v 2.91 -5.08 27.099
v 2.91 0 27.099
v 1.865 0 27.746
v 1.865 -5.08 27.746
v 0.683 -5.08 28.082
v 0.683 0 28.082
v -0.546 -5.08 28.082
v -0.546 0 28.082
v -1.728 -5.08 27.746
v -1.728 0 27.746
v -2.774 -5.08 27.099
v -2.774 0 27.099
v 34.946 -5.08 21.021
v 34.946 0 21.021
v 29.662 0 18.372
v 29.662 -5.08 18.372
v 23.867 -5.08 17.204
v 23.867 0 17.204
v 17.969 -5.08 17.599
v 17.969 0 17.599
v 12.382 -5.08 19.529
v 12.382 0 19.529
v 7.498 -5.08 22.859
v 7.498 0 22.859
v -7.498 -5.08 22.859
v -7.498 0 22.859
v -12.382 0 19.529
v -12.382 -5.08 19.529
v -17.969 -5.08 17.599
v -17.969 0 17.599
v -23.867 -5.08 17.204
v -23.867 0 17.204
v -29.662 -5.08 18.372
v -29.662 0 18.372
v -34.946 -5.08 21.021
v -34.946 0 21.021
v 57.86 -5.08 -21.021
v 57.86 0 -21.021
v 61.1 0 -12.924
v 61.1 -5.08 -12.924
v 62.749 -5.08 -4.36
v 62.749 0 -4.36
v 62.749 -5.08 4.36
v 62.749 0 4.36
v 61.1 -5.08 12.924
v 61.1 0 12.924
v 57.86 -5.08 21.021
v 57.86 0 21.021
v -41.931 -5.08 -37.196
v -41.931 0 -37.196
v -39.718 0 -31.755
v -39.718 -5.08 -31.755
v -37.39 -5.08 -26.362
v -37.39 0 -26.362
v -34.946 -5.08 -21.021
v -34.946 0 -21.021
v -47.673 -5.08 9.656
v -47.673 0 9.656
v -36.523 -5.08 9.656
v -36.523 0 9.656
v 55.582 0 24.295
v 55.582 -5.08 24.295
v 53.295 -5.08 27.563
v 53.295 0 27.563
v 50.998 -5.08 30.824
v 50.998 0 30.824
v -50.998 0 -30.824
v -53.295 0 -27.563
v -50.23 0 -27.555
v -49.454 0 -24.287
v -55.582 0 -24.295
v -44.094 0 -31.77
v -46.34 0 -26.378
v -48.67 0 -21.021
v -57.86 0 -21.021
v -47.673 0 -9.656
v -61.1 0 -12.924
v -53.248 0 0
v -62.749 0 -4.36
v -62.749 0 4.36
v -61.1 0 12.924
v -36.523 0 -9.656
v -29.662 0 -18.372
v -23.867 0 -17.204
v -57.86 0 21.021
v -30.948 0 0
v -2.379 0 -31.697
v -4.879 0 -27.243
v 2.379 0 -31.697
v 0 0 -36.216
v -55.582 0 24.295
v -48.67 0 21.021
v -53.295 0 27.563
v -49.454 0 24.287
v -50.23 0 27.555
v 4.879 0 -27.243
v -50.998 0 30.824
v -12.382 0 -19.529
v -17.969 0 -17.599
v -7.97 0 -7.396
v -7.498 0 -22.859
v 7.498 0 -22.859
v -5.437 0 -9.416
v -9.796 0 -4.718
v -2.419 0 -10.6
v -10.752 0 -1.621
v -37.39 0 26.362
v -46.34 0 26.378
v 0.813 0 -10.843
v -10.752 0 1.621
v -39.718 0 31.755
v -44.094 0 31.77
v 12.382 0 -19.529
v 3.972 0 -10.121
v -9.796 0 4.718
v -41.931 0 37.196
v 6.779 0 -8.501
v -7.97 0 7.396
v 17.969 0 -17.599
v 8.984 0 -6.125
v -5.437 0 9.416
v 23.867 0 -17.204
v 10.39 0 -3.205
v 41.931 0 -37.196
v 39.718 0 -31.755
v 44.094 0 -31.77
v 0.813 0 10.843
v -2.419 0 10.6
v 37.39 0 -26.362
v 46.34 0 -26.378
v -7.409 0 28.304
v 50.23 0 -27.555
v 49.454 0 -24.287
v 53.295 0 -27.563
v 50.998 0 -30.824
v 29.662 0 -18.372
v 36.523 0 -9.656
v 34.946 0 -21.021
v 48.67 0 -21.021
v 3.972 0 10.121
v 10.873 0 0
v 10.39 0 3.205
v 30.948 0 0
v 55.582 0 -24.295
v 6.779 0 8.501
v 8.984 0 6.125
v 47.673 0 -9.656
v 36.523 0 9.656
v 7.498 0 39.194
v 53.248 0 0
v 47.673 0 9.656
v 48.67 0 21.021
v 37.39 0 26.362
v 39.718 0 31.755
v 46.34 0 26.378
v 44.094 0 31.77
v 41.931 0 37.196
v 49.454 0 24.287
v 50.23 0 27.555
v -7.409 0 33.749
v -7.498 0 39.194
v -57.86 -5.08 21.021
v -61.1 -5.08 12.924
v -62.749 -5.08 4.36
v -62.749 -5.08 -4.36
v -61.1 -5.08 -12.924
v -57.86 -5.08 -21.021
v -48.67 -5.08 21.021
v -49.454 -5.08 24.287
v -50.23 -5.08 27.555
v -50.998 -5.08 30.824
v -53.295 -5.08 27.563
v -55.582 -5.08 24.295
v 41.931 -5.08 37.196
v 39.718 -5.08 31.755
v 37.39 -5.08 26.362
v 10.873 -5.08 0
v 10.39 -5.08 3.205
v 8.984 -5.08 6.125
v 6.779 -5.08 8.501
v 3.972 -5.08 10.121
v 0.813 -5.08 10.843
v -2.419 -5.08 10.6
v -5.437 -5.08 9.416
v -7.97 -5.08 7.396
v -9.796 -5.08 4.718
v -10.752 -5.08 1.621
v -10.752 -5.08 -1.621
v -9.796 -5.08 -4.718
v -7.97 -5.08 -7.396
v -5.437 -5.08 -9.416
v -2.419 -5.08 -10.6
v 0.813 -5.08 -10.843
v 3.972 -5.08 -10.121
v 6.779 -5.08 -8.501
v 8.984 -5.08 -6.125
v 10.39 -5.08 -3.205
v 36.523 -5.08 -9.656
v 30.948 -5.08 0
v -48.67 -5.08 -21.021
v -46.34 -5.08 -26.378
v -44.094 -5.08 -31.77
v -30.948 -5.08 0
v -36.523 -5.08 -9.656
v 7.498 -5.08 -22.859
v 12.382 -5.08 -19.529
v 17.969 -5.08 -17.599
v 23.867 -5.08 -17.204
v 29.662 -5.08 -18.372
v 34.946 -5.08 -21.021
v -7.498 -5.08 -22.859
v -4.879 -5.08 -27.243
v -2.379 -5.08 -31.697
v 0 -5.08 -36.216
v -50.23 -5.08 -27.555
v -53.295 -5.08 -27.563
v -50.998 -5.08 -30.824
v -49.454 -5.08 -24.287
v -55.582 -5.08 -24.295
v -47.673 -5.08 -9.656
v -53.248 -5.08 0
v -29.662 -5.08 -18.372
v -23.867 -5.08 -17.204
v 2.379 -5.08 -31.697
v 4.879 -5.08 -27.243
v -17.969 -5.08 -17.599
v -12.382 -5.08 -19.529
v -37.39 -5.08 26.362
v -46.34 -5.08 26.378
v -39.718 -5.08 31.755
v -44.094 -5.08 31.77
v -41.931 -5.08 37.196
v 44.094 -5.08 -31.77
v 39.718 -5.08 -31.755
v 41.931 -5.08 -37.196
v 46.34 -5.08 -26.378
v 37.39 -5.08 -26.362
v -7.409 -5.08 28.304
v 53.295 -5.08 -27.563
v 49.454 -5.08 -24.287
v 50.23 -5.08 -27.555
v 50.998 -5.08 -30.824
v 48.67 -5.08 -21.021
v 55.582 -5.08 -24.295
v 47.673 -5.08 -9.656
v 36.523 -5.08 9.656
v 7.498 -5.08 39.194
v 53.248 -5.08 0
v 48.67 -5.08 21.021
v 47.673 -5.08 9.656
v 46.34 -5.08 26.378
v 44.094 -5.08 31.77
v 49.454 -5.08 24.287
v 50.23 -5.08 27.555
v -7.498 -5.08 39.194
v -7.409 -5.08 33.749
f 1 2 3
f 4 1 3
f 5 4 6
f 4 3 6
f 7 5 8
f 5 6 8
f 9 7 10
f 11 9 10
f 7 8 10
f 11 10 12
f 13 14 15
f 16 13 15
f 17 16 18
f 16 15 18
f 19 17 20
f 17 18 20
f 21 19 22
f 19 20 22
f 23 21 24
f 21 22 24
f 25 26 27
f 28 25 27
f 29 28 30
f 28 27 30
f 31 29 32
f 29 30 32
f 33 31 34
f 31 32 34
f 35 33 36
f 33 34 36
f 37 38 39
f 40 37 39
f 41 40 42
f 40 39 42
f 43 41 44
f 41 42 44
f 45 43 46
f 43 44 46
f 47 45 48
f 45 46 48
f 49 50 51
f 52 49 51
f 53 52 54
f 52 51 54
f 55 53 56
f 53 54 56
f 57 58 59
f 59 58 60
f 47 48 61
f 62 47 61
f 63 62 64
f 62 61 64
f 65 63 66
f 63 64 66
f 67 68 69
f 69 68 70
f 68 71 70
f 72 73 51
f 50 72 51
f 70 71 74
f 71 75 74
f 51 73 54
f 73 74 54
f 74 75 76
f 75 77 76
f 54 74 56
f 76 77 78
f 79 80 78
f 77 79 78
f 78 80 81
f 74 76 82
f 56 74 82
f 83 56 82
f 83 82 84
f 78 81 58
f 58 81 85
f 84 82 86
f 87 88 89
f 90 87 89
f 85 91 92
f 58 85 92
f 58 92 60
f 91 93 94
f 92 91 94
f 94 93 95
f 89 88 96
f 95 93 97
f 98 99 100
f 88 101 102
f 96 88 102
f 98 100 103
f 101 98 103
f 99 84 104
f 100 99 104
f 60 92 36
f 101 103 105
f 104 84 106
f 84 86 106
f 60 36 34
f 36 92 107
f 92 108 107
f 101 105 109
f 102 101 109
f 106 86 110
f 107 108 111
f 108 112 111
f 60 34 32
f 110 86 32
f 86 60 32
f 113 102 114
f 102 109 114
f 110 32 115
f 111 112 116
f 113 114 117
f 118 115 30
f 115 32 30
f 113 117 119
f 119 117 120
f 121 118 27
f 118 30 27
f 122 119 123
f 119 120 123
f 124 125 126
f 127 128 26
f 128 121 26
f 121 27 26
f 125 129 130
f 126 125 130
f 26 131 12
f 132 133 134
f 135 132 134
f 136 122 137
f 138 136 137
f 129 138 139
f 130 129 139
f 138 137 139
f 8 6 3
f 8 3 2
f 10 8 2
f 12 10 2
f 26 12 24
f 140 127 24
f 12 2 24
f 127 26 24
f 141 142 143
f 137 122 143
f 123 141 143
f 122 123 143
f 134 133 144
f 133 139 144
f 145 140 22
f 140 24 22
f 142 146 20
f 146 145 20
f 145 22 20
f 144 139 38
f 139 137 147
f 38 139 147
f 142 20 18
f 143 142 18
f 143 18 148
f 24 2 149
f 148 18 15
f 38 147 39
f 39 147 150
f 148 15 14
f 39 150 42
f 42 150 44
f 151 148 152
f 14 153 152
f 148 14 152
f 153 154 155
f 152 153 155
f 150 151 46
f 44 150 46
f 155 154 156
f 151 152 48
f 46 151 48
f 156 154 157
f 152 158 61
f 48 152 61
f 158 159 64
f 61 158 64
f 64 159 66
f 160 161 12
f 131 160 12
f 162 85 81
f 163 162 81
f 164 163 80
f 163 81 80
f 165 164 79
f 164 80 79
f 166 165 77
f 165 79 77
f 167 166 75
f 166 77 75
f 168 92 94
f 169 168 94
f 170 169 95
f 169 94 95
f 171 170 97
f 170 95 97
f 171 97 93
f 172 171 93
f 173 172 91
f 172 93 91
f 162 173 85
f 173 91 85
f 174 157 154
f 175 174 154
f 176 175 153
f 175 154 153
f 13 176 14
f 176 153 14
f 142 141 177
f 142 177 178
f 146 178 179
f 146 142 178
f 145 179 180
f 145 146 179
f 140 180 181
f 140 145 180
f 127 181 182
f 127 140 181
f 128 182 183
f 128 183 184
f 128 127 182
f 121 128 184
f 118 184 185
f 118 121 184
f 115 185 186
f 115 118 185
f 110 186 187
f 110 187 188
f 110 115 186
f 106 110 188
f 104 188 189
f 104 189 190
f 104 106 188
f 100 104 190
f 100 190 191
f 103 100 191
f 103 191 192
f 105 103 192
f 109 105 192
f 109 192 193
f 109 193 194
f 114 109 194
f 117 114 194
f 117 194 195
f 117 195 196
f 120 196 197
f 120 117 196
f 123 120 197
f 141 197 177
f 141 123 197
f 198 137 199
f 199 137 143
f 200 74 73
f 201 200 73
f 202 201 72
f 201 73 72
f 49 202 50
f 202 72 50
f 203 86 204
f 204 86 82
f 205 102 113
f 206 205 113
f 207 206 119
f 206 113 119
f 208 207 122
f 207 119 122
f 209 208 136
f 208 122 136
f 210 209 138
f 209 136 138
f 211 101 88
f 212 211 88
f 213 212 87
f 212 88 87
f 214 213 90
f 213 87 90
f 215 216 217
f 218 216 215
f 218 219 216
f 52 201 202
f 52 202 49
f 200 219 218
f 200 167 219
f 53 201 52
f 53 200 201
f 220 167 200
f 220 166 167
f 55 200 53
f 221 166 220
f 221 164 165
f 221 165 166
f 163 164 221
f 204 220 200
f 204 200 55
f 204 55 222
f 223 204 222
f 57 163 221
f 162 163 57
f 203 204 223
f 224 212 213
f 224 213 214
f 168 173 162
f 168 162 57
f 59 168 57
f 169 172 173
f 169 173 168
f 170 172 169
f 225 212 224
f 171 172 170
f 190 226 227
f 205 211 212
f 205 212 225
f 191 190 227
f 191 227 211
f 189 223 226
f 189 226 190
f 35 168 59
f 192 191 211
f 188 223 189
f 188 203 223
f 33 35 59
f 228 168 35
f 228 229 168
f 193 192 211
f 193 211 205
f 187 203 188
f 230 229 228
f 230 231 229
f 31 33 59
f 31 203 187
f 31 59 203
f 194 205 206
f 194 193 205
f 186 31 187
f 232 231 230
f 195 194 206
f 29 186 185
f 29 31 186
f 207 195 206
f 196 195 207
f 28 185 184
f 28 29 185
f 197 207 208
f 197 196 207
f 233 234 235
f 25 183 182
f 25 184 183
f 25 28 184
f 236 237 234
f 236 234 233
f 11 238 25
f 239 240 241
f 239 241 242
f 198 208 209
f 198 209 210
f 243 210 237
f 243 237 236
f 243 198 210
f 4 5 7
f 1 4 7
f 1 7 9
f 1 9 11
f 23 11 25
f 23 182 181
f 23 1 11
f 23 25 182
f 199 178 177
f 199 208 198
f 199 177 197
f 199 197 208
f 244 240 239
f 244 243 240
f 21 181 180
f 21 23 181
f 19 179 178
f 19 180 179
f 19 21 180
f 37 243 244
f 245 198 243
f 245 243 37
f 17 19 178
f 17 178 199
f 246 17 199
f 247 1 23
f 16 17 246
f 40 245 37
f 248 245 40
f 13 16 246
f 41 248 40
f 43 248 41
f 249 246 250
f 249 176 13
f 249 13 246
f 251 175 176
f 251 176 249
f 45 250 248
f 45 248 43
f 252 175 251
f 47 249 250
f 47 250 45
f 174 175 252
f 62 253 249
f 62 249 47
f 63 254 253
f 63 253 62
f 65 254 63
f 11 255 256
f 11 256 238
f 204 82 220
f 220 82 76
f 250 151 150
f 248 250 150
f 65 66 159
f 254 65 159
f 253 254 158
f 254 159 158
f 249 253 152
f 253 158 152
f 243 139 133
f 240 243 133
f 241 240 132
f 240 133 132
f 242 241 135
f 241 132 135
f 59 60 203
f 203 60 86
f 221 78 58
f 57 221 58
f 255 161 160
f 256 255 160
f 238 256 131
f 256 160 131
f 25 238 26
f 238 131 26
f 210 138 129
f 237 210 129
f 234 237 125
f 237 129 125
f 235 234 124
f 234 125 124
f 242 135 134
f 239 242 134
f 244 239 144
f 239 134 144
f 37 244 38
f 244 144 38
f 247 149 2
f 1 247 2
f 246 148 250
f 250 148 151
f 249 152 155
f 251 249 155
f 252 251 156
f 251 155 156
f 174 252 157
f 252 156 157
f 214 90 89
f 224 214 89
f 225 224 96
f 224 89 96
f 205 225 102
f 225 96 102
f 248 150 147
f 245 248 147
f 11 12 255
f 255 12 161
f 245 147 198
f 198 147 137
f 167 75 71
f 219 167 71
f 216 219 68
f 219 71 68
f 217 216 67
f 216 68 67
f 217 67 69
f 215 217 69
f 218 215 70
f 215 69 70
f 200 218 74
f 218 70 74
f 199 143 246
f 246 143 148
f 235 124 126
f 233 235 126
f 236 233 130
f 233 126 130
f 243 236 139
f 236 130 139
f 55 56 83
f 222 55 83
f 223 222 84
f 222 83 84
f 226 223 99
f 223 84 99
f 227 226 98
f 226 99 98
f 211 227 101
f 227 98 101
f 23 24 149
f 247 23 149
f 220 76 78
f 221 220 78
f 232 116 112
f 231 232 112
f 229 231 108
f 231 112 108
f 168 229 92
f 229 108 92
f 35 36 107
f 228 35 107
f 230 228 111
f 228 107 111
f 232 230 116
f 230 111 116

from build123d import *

# Parameters (mm, degrees)
F0_R     = 10.873019
F1_DEPTH = 5.08


with BuildPart() as f1:
    # F0 (on Front) → F1 (new body)
    with BuildSketch(Plane.XZ):
        with BuildLine():
            ThreePointArc((-7.49769, -22.859156), (-3.613745, -29.461579), (0, -36.215678))
            ThreePointArc((0, -36.215678), (3.613745, -29.461579), (7.49769, -22.859156))
            ThreePointArc((7.49769, -22.859156), (20.904776, -17.20558), (34.945954, -21.021102))
            ThreePointArc((34.945954, -21.021102), (38.568356, -29.052358), (41.93056, -37.195973))
            ThreePointArc((41.93056, -37.195973), (45.206649, -29.069506), (48.670087, -21.021102))
            ThreePointArc((48.670087, -21.021102), (49.842619, -25.920576), (50.998289, -30.824054))
            ThreePointArc((50.998289, -30.824054), (54.439372, -25.929613), (57.860356, -21.021102))
            ThreePointArc((57.860356, -21.021102), (62.956488, 0), (57.860356, 21.021102))
            ThreePointArc((57.860356, 21.021102), (54.439372, 25.929613), (50.998289, 30.824054))
            ThreePointArc((50.998289, 30.824054), (49.842619, 25.920576), (48.670087, 21.021102))
            ThreePointArc((48.670087, 21.021102), (45.206649, 29.069506), (41.93056, 37.195973))
            ThreePointArc((41.93056, 37.195973), (38.568356, 29.052358), (34.945954, 21.021102))
            ThreePointArc((34.945954, 21.021102), (20.904776, 17.20558), (7.49769, 22.859156))
            Line((7.49769, 22.859156), (7.49769, 39.19407))
            Line((7.49769, 39.19407), (2.909613, 27.099166))
            ThreePointArc((2.909613, 27.099166), (0.068039, 28.124589), (-2.773535, 27.099166))
            Line((-2.773535, 27.099166), (-7.49769, 39.19407))
            ThreePointArc((-7.49769, 39.19407), (-7.397431, 31.026613), (-7.49769, 22.859156))
            ThreePointArc((-7.49769, 22.859156), (-20.904776, 17.20558), (-34.945954, 21.021102))
            ThreePointArc((-34.945954, 21.021102), (-38.568356, 29.052358), (-41.93056, 37.195973))
            ThreePointArc((-41.93056, 37.195973), (-45.206649, 29.069506), (-48.670087, 21.021102))
            ThreePointArc((-48.670087, 21.021102), (-49.842619, 25.920576), (-50.998289, 30.824054))
            ThreePointArc((-50.998289, 30.824054), (-54.439372, 25.929613), (-57.860356, 21.021102))
            ThreePointArc((-57.860356, 21.021102), (-62.956488, 0), (-57.860356, -21.021102))
            ThreePointArc((-57.860356, -21.021102), (-54.439372, -25.929613), (-50.998289, -30.824054))
            ThreePointArc((-50.998289, -30.824054), (-49.842619, -25.920576), (-48.670087, -21.021102))
            ThreePointArc((-48.670087, -21.021102), (-45.206649, -29.069506), (-41.93056, -37.195973))
            ThreePointArc((-41.93056, -37.195973), (-38.568356, -29.052358), (-34.945954, -21.021102))
            ThreePointArc((-34.945954, -21.021102), (-20.904776, -17.20558), (-7.49769, -22.859156))
        make_face()
        Polygon((-47.67337, 9.656313), (-36.52322, 9.656313), (-30.948145, 0), (-36.52322, -9.656313), (-47.67337, -9.656313), (-53.248445, 0), align=None, mode=Mode.SUBTRACT)
        Circle(F0_R, mode=Mode.SUBTRACT)
        Polygon((30.948145, 0), (36.52322, 9.656313), (47.67337, 9.656313), (53.248445, 0), (47.67337, -9.656313), (36.52322, -9.656313), align=None, mode=Mode.SUBTRACT)
    extrude(amount=F1_DEPTH)


solid = f1.part
